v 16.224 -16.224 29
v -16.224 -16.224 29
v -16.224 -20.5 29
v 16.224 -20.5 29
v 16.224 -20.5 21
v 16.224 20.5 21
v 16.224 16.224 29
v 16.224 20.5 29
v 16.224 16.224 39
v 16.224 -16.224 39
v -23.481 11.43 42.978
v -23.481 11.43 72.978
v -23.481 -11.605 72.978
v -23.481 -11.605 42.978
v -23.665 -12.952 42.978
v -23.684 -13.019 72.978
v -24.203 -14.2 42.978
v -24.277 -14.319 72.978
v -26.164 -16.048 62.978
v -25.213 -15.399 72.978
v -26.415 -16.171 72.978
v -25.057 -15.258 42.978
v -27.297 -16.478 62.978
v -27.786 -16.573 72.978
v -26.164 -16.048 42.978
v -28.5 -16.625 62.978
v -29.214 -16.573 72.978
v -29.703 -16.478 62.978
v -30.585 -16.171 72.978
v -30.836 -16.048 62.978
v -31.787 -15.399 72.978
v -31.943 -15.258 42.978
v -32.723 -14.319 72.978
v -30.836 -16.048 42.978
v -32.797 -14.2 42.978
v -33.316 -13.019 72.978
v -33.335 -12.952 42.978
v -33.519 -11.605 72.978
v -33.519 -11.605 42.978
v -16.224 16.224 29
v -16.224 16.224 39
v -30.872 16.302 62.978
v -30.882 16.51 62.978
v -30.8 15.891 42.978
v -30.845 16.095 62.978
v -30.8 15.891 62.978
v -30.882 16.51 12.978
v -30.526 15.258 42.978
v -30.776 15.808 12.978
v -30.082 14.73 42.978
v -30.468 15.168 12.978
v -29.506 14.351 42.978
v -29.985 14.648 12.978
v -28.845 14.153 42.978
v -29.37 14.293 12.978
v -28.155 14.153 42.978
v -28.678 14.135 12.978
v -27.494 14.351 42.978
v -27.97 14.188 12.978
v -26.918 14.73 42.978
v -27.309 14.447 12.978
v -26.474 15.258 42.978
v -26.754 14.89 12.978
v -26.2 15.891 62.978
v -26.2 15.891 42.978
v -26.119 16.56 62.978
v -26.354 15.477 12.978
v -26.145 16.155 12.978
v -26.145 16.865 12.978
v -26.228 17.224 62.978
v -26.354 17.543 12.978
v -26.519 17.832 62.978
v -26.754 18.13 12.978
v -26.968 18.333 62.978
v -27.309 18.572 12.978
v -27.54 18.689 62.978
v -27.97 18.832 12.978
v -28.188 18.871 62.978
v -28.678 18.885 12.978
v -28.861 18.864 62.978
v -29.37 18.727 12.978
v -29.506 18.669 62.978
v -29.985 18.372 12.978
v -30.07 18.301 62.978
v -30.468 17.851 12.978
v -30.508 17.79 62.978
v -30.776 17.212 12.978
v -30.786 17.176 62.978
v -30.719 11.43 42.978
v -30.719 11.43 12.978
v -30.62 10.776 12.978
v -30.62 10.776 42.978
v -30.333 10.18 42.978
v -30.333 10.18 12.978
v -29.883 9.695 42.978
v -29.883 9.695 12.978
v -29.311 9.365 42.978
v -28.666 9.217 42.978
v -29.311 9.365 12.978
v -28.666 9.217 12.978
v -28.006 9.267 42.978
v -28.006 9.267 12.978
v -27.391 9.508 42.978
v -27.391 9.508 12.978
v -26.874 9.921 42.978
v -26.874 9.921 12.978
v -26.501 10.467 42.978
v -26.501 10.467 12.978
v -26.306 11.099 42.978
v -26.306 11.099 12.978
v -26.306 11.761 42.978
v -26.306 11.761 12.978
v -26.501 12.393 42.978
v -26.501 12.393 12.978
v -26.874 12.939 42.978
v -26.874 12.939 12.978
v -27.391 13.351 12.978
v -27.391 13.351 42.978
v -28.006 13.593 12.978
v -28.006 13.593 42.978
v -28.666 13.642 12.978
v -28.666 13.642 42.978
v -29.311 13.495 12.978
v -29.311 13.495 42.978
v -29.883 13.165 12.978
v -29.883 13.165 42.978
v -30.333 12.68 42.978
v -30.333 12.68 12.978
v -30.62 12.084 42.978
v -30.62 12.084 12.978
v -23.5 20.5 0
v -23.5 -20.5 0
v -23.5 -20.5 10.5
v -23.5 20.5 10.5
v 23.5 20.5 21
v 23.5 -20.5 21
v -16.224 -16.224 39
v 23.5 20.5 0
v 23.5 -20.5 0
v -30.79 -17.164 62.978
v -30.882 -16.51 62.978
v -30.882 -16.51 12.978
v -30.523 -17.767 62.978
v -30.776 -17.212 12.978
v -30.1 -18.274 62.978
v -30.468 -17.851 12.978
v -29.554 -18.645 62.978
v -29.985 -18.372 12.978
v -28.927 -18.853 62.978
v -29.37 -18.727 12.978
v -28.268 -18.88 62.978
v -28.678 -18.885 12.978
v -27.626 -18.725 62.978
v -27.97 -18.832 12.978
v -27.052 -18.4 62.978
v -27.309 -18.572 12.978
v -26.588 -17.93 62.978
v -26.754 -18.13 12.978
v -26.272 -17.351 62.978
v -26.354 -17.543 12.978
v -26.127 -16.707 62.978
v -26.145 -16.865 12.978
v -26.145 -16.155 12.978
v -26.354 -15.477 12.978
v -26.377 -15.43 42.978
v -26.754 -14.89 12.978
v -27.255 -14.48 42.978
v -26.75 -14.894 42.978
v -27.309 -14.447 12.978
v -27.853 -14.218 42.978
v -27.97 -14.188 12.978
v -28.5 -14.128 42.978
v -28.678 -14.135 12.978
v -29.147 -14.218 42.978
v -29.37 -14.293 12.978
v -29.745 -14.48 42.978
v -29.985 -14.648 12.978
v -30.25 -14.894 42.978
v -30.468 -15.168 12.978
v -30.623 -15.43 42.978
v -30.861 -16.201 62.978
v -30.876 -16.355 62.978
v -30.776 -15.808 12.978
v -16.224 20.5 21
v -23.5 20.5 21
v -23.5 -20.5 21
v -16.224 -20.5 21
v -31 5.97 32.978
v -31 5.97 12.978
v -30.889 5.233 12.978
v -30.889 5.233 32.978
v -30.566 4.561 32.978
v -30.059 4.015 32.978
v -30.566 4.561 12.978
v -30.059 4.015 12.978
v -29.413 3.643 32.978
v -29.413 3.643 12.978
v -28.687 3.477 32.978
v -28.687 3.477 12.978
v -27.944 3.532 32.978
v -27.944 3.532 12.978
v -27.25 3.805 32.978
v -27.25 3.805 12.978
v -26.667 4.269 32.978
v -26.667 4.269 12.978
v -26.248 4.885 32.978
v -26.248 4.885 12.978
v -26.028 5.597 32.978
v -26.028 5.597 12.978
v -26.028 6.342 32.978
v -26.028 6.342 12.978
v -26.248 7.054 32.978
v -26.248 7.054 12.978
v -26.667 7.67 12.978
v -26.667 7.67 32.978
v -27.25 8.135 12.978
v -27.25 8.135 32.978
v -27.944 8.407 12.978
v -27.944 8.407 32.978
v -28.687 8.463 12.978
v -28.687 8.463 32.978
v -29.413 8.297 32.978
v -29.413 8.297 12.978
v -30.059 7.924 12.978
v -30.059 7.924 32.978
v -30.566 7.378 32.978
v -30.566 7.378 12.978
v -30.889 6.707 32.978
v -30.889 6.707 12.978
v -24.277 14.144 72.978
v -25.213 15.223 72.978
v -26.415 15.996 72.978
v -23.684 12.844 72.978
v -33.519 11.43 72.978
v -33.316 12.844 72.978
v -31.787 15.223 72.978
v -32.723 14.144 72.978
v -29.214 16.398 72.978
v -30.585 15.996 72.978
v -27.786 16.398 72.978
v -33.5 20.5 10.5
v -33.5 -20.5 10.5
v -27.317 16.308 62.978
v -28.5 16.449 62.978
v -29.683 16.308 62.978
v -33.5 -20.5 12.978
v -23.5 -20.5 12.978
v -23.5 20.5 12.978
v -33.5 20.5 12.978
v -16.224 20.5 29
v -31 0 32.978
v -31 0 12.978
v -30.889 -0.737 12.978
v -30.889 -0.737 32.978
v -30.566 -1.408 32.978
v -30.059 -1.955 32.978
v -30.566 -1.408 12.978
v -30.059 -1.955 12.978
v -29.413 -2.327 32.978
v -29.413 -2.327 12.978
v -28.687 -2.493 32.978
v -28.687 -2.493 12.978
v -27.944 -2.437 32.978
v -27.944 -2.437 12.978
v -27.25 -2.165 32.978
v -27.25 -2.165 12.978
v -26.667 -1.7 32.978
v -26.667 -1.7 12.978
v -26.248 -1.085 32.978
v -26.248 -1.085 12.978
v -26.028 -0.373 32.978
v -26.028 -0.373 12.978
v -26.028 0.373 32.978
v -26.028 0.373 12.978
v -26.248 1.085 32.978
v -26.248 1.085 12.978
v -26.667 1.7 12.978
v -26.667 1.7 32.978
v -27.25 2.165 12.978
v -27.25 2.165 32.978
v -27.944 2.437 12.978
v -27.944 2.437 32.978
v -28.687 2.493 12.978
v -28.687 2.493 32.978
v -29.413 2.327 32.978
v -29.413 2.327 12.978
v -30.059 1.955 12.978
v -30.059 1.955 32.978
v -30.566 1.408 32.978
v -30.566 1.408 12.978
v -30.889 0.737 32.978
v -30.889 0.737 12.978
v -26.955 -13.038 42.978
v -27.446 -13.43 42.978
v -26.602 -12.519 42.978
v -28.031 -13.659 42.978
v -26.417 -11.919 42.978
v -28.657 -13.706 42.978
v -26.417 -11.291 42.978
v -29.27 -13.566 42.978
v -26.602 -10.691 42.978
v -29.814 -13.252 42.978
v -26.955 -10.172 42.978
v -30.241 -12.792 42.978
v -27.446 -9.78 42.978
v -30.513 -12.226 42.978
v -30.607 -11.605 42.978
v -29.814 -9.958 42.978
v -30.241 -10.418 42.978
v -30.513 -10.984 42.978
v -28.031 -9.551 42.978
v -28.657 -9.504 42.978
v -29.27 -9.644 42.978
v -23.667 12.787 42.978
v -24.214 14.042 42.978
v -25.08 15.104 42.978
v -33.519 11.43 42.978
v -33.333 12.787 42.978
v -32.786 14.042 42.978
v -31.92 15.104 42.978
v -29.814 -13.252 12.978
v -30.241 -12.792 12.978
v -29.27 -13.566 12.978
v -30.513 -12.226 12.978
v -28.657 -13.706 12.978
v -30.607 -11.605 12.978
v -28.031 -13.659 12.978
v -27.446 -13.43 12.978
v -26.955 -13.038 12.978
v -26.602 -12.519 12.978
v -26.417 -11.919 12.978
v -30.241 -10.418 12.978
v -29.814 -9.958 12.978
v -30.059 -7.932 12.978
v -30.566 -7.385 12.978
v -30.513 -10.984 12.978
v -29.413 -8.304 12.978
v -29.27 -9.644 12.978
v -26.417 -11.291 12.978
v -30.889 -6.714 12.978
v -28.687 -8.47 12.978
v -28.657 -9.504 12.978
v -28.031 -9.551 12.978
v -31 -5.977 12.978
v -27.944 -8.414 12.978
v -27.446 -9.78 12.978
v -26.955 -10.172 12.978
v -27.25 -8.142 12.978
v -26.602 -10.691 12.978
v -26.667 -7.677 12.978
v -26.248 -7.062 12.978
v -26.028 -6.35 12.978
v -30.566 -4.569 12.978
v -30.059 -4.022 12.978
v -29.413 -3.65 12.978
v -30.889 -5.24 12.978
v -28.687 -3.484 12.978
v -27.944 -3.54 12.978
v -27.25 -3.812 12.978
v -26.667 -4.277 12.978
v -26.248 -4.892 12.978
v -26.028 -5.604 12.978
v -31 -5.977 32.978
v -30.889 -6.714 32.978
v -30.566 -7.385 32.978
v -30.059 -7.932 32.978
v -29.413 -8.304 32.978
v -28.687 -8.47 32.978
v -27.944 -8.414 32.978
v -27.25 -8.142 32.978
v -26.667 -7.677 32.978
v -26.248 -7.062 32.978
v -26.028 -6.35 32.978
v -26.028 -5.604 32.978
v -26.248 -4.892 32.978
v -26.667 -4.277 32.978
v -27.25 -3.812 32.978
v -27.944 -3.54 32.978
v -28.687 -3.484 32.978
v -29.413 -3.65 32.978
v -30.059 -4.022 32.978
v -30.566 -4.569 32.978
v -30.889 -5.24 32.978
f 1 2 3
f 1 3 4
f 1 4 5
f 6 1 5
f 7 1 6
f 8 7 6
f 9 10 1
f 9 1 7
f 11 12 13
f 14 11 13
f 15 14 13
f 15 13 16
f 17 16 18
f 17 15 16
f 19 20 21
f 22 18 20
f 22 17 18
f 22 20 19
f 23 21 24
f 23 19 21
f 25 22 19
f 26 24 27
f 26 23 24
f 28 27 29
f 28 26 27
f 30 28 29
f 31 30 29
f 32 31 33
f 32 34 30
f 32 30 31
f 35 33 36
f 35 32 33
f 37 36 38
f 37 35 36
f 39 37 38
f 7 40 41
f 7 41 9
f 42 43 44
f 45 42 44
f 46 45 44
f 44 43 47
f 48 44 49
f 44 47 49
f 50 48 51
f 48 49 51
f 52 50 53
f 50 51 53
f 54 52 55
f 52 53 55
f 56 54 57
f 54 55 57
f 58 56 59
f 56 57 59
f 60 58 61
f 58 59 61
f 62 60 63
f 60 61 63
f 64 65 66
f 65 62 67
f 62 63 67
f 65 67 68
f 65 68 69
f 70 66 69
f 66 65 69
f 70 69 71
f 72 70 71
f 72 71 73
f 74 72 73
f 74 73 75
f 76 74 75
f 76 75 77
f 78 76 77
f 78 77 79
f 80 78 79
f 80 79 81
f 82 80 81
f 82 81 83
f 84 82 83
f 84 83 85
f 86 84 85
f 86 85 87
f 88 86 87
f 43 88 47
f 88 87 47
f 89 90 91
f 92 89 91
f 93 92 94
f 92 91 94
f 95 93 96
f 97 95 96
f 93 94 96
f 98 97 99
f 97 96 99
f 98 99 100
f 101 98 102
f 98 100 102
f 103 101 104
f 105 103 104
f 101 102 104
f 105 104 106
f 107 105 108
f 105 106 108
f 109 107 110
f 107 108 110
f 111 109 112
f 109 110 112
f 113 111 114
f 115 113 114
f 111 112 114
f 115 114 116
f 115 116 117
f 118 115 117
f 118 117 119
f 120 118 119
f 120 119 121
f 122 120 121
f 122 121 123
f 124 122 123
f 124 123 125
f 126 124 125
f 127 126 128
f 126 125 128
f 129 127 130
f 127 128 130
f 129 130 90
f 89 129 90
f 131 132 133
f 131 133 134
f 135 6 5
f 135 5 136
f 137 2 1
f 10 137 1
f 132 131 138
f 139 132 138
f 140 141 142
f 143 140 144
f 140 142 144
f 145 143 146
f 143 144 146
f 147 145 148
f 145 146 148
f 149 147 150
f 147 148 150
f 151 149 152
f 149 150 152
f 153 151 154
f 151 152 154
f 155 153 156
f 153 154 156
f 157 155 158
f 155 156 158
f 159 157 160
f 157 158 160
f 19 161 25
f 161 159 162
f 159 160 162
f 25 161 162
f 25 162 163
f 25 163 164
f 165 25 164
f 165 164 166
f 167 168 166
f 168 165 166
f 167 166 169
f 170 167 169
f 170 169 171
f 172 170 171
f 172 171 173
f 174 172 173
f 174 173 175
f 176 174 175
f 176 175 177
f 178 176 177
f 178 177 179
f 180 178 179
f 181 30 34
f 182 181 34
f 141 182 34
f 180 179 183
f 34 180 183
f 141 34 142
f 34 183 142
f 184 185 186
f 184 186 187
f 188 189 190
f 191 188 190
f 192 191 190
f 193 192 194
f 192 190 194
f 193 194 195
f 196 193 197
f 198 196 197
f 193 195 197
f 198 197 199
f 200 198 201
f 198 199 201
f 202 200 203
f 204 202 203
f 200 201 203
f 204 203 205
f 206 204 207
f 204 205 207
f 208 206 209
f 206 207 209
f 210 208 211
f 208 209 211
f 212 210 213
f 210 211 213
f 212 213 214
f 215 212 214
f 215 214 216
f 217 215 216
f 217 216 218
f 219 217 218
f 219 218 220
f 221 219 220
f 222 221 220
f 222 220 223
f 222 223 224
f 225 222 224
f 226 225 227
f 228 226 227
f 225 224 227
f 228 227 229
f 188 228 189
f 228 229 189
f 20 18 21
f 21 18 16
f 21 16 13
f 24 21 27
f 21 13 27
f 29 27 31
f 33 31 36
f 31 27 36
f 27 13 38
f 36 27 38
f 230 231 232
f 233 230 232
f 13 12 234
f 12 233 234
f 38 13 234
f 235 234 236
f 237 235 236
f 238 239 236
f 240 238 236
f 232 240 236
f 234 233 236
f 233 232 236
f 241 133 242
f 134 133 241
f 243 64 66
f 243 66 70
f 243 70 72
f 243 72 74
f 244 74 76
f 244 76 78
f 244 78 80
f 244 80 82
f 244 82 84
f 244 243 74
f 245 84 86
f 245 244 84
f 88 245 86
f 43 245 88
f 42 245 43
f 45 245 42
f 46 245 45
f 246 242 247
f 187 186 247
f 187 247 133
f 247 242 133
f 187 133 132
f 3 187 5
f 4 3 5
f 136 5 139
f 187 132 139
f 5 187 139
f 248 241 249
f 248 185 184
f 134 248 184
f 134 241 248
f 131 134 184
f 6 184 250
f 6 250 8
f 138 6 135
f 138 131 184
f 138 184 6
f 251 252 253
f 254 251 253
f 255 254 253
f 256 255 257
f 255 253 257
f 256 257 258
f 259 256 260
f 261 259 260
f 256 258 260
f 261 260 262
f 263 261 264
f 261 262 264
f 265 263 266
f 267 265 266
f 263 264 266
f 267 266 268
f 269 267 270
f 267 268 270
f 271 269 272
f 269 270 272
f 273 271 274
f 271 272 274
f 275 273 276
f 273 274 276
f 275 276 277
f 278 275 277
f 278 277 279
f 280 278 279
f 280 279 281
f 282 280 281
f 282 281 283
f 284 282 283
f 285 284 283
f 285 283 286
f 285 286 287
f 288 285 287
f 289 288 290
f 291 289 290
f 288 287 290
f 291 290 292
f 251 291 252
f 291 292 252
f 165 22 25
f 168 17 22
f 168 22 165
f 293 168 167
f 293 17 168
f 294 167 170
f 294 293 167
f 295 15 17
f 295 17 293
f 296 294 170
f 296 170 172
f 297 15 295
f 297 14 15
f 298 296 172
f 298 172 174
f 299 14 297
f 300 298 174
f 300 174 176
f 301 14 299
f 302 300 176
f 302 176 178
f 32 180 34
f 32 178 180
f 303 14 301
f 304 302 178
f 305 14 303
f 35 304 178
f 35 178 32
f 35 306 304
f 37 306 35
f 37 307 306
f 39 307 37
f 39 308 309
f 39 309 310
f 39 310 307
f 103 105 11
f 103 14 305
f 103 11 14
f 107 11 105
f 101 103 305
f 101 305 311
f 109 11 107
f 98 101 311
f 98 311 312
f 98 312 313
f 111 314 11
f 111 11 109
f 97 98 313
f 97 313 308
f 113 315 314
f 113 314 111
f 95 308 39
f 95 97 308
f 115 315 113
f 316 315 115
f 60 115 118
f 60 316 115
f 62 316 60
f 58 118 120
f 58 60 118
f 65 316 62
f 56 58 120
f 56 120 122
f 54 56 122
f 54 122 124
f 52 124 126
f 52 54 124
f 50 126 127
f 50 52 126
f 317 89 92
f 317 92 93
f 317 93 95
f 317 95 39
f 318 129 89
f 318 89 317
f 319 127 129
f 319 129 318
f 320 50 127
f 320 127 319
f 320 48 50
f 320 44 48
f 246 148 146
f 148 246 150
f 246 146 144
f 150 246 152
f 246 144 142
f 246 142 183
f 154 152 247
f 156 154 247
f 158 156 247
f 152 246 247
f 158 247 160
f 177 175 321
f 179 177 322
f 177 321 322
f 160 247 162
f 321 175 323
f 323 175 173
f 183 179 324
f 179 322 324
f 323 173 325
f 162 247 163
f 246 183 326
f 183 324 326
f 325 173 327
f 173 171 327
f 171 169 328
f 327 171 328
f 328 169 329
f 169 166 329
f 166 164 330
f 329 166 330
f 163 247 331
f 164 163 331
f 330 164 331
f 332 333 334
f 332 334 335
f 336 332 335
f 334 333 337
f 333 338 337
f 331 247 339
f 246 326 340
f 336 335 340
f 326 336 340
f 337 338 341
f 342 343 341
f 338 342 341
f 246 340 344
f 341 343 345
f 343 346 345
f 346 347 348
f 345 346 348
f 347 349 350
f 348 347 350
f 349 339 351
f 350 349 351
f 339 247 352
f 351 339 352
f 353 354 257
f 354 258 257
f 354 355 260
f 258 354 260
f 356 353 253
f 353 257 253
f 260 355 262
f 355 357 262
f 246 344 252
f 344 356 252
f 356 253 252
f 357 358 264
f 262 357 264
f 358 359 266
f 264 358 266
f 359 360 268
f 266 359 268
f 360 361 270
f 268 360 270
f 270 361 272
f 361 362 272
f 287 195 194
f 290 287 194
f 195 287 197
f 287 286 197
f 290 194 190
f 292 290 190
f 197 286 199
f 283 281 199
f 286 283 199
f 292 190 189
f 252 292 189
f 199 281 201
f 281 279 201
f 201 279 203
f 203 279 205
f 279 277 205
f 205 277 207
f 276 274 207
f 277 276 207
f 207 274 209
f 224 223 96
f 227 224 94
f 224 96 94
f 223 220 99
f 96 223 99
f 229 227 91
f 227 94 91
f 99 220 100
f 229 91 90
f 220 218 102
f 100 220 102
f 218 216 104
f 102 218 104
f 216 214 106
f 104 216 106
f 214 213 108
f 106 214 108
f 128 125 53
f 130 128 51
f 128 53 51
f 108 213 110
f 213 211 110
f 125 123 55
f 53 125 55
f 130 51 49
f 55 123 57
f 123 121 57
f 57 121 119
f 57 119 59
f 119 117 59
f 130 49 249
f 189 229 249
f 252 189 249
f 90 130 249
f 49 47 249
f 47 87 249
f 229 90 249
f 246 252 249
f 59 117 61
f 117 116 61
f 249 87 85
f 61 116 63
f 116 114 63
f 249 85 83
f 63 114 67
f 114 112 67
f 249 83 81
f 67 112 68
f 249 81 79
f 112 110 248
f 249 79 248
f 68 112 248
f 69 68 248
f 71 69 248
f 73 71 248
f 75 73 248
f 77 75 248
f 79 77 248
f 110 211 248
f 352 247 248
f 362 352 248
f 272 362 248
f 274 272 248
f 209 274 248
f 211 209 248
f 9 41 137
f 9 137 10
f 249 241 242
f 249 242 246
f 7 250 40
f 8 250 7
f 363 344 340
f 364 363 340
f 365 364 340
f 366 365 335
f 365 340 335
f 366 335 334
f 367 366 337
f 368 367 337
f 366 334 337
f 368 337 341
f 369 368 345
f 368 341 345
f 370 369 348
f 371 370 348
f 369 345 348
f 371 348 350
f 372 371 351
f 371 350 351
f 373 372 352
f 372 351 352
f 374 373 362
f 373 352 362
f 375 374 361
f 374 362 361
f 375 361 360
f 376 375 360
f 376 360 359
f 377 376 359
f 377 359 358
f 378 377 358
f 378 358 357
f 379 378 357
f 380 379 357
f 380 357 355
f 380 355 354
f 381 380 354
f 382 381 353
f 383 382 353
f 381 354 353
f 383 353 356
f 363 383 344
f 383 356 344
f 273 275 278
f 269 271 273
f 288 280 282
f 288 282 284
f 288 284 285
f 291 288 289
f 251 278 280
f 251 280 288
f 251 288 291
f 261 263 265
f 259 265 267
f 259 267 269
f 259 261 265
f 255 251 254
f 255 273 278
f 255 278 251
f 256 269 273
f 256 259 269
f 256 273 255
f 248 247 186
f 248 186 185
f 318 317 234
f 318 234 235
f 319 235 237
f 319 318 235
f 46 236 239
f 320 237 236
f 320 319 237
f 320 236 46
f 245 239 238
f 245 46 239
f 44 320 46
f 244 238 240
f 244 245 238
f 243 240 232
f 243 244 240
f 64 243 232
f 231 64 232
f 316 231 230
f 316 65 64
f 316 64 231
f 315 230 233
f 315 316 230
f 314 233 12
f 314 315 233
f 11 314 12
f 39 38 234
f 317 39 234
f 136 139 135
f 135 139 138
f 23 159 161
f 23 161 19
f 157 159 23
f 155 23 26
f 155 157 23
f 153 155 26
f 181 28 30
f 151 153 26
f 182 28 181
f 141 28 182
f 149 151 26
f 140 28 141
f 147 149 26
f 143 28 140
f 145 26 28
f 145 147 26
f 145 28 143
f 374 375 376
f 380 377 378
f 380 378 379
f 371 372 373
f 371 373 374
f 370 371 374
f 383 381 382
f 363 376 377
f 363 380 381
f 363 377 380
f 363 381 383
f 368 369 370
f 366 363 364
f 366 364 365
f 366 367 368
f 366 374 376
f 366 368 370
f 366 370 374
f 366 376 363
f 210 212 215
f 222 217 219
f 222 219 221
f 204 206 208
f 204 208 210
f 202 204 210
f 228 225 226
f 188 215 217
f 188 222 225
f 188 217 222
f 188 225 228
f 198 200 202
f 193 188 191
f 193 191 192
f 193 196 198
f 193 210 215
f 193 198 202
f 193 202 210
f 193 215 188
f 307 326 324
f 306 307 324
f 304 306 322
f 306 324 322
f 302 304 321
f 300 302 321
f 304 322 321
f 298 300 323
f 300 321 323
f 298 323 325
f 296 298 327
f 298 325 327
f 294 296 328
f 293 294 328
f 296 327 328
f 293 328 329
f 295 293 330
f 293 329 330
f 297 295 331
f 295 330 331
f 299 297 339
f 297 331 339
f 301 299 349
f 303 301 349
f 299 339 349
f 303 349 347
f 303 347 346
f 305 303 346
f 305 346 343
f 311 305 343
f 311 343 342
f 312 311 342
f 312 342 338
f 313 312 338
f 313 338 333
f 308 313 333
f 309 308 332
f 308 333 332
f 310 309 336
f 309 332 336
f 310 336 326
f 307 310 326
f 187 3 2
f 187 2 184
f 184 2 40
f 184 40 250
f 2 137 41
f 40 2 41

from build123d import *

# Parameters (mm, degrees)
SKETCH_1_W          = 47
SKETCH_1_H          = 41
EXTRUDE_1_DEPTH     = 29
SKETCH_2_W          = 7.275664065
SKETCH_2_H          = 41
CUT_EXTRUDE_1_DEPTH = 8
SKETCH_3_W          = 32.44867187
SKETCH_3_H          = 32.44867187
EXTRUDE_2_DEPTH     = 10
SKETCH_4_W          = 2.477658442
SKETCH_4_H          = 41
EXTRUDE_3_DEPTH     = 10
SKETCH_5_R          = 2.381517546
EXTRUDE_4_DEPTH     = 50
SKETCH_6_R          = 2.5
EXTRUDE_5_DEPTH     = 20
SKETCH_7_R          = 2.218731485
SKETCH_7_R_2        = 2.107008454
EXTRUDE_6_DEPTH     = 30
EXTRUDE_7_DEPTH     = 30


with BuildPart() as part:
    # Эскиз1 → Бобышка-Вытянуть1 (new body)
    with BuildSketch(Plane.XY):
        Rectangle(SKETCH_1_W, SKETCH_1_H)
    extrude(amount=EXTRUDE_1_DEPTH)

    # Эскиз2 → Вырез-Вытянуть1 (cut)
    with BuildSketch(Plane.XY.offset(29)):
        with Locations((-19.862167967, 0)):
            Rectangle(SKETCH_2_W, SKETCH_2_H)
        with Locations((19.862167967, 0)):
            Rectangle(SKETCH_2_W, SKETCH_2_H)
    extrude(amount=-CUT_EXTRUDE_1_DEPTH, mode=Mode.SUBTRACT)

    # Эскиз3 → Бобышка-Вытянуть2 (add)
    with BuildSketch(Plane.XY.offset(29)):
        Rectangle(SKETCH_3_W, SKETCH_3_H)
    extrude(amount=EXTRUDE_2_DEPTH)

    # Эскиз4 → Бобышка-Вытянуть3 (add)
    with BuildSketch(Plane.ZY.offset(23.5)):
        with Locations((11.738829221, 0)):
            Rectangle(SKETCH_4_W, SKETCH_4_H)
    extrude(amount=EXTRUDE_3_DEPTH)

    # Эскиз5 → Бобышка-Вытянуть4 (add)
    with BuildSketch(Plane.XY.offset(12.977658442)):
        with Locations(Location((-28.5, 16.509831399, 0), (0, 0, 180))):
            Circle(SKETCH_5_R)
        with Locations(Location((-28.5, -16.509831399, 0), (0, 0, 180))):
            Circle(SKETCH_5_R)
    extrude(amount=EXTRUDE_4_DEPTH)

    # Эскиз6 → Бобышка-Вытянуть5 (add)
    with BuildSketch(Plane.XY.offset(12.977658442)):
        with Locations(Location((-28.5, 5.969771762, 0), (0, 0, 180))):
            Circle(SKETCH_6_R)
        with Locations(Location((-28.5, 0, 0), (0, 0, 180))):
            Circle(SKETCH_6_R)
        with Locations(Location((-28.5, -5.977057546, 0), (0, 0, 180))):
            Circle(SKETCH_6_R)
    extrude(amount=EXTRUDE_5_DEPTH)

    # Эскиз7 → Бобышка-Вытянуть6 (add)
    with BuildSketch(Plane.XY.offset(12.977658442)):
        with Locations(Location((-28.5, 11.429883276, 0), (0, 0, 180))):
            Circle(SKETCH_7_R)
        with Locations(Location((-28.5, -11.605053901, 0), (0, 0, 180))):
            Circle(SKETCH_7_R_2)
    extrude(amount=EXTRUDE_6_DEPTH)

    # Эскиз8 → Бобышка-Вытянуть7 (add)
    with BuildSketch(Plane.XY.offset(42.977658442)):
        with BuildLine():
            Line((-23.480513429, 11.429883276), (-23.480513429, -11.605053901))
            ThreePointArc((-23.480513429, -11.605053901), (-28.5, -16.624540472), (-33.519486571, -11.605053901))
            Line((-33.519486571, -11.605053901), (-33.519486571, 11.429883276))
            ThreePointArc((-33.519486571, 11.429883276), (-28.5, 16.449369847), (-23.480513429, 11.429883276))
        make_face()
    extrude(amount=EXTRUDE_7_DEPTH)


solid = part.part
